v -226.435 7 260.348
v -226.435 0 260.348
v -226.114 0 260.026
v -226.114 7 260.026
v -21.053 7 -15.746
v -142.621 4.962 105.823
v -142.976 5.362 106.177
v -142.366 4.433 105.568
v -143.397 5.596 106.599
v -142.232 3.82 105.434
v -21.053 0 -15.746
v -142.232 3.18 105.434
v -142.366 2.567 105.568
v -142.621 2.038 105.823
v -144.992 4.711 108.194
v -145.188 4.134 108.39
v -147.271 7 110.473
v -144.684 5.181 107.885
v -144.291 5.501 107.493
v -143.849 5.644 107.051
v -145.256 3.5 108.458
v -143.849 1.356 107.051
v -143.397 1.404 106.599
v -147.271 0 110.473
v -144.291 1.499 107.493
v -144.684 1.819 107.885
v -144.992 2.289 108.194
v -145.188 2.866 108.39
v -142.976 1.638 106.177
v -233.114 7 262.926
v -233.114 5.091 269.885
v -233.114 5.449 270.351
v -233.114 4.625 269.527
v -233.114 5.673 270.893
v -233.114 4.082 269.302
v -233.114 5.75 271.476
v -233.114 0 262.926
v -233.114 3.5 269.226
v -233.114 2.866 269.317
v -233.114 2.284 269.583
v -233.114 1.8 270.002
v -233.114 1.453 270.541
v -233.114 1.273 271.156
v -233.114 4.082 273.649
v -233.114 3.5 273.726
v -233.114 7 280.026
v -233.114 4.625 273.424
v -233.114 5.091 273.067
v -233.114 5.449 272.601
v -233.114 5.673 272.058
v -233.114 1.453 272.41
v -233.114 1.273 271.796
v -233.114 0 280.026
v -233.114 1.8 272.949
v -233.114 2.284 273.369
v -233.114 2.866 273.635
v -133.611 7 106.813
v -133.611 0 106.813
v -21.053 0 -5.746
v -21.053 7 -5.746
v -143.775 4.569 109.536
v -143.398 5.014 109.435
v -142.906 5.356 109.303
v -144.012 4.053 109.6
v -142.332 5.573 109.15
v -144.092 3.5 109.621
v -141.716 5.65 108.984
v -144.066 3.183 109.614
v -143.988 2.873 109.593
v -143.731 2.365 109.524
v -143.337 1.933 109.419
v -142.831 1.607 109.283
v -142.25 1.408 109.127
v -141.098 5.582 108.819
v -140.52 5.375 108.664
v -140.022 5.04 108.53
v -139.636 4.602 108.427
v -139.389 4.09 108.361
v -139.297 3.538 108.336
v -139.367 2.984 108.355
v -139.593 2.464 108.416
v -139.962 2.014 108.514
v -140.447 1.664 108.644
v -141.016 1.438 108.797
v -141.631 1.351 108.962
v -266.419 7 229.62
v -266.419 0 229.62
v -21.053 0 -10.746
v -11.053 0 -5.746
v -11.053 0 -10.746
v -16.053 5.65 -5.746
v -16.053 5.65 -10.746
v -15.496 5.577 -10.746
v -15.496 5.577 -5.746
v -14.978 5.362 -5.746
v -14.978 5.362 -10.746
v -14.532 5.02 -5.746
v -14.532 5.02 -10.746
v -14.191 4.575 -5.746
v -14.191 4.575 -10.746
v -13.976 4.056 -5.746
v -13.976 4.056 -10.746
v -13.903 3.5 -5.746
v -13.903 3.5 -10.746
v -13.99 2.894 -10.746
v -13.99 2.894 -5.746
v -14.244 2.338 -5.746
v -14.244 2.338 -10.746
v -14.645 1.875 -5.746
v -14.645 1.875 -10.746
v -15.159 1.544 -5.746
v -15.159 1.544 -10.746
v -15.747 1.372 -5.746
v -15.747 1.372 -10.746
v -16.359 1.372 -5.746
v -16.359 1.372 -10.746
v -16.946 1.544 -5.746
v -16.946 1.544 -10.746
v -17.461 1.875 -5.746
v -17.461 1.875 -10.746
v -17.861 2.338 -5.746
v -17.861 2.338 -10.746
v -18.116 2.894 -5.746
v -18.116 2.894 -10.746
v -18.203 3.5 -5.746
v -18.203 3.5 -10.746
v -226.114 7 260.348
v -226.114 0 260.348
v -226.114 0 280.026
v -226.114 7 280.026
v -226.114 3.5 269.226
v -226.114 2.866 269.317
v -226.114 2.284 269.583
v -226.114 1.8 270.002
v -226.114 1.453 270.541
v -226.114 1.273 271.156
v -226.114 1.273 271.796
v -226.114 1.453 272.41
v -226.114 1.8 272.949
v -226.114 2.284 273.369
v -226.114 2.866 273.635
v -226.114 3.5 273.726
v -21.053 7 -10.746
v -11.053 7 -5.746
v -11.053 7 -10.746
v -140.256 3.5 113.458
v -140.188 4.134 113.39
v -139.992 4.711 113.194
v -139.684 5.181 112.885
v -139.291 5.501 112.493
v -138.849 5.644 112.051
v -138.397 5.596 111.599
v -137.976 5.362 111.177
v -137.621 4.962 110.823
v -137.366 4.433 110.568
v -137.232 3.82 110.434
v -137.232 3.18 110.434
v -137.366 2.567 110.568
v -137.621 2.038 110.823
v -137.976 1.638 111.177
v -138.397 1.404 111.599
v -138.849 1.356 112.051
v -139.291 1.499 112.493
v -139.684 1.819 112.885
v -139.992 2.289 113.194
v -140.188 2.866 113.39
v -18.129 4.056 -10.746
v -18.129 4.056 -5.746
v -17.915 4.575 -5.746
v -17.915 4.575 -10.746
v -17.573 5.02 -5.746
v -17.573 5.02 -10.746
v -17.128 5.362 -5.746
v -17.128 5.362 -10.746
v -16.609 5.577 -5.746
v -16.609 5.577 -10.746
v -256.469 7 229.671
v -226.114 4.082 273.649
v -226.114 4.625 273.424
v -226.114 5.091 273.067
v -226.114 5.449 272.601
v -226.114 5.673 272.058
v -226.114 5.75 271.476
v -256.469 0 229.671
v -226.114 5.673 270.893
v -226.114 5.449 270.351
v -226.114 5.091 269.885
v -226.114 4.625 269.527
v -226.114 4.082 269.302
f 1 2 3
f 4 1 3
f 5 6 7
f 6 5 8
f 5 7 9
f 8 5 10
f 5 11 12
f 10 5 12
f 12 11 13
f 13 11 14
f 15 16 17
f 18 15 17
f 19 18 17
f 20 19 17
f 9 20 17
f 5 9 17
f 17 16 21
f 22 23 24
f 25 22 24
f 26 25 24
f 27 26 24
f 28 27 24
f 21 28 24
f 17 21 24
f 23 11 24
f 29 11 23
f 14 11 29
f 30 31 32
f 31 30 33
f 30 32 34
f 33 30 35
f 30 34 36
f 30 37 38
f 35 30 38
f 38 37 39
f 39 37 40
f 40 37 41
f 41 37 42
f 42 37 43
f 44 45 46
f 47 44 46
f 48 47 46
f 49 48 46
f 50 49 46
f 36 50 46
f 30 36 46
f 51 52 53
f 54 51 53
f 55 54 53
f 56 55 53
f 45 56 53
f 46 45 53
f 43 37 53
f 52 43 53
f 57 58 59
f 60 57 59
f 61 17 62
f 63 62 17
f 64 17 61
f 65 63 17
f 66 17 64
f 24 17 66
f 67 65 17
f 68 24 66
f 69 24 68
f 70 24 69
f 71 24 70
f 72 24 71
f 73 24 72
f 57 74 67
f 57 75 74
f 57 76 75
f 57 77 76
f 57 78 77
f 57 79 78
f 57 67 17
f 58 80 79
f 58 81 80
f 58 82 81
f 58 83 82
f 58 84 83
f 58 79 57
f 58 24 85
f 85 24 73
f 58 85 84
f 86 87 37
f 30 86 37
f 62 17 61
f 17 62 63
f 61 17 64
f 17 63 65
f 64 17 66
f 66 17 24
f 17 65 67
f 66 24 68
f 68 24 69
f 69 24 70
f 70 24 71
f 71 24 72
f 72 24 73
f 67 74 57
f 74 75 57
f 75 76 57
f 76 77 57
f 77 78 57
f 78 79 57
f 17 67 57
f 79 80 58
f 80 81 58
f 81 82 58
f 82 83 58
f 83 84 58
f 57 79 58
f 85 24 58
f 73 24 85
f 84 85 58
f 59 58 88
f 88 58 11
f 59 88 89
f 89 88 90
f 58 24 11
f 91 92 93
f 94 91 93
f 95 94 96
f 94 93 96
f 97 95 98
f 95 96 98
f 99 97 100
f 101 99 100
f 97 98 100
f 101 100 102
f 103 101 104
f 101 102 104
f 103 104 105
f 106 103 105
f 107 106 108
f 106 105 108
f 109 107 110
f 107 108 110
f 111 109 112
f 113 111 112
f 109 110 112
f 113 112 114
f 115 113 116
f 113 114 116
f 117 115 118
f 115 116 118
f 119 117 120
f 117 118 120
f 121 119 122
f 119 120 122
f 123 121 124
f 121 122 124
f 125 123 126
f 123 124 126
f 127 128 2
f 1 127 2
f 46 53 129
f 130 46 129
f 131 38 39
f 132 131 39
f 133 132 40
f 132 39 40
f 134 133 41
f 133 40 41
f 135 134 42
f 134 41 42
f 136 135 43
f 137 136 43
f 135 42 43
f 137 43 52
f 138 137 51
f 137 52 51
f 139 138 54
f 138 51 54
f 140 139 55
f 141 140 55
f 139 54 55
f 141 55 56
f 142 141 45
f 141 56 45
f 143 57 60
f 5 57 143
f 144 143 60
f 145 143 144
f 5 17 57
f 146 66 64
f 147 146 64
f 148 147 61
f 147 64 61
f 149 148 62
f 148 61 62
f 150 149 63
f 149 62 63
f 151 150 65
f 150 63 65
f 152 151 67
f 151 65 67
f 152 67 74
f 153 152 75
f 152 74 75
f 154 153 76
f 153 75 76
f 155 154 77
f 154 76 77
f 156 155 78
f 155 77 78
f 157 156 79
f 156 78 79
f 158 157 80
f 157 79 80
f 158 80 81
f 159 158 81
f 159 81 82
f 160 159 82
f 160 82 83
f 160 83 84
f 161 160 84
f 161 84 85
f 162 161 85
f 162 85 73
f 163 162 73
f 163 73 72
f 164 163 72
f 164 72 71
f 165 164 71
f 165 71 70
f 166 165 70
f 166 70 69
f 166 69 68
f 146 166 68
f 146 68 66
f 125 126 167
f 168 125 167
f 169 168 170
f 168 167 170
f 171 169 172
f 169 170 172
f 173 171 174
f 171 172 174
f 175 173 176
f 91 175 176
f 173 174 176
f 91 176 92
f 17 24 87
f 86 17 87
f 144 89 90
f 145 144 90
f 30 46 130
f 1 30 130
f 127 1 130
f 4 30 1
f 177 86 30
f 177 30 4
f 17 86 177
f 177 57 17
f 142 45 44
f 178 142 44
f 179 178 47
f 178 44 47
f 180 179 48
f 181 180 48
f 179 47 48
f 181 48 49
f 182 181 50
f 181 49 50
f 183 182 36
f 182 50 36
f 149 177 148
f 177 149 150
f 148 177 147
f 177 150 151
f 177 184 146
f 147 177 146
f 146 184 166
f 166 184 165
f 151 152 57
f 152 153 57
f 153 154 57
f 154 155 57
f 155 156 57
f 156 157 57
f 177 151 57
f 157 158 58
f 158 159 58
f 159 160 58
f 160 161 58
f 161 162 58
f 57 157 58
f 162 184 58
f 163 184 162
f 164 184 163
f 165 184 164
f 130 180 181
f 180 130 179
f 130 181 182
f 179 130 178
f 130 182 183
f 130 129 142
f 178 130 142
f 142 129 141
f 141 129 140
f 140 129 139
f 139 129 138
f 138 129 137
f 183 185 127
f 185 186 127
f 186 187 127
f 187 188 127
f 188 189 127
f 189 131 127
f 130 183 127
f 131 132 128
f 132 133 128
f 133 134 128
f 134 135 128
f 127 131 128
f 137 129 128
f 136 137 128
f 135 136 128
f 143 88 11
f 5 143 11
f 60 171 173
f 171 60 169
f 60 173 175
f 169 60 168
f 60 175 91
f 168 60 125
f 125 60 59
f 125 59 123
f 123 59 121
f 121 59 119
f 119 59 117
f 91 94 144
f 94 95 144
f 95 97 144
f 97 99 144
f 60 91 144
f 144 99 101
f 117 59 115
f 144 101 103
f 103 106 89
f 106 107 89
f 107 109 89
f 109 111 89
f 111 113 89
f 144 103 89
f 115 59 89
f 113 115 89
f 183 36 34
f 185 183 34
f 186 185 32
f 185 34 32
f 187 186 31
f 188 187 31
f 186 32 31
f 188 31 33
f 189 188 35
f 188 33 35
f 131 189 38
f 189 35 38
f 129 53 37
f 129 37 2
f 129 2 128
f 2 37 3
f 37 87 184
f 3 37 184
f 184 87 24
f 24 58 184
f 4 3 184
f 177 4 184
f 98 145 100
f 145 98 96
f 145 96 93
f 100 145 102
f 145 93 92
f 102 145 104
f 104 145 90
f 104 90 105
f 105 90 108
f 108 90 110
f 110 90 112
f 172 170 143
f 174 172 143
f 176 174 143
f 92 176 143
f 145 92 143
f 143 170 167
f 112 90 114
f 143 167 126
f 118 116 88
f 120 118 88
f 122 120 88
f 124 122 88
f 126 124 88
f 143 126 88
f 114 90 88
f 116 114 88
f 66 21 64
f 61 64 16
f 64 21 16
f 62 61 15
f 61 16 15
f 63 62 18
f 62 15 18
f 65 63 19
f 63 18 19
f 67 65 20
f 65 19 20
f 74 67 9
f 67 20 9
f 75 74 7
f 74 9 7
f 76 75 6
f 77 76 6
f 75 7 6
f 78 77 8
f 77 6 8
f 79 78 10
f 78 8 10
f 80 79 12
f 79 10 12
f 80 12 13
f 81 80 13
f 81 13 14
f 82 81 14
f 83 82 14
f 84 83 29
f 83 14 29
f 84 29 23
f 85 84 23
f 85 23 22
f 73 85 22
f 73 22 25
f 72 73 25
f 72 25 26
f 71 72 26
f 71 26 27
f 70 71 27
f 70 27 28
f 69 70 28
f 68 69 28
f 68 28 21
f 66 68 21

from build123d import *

# Parameters (mm, degrees)
BOSS_EXTRU_1_DEPTH           = 7
ENL_V_MAT_EXTRU_1_DEPTH      = 7
ENL_V_MAT_EXTRU_2_DEPTH      = 7
ESQUISSE8_R                  = 2.15
ENL_V_MAT_EXTRU_3_DEPTH      = 10
FRACTIONNER1_SURFACE_1_BACK  = 391.822
FRACTIONNER1_SURFACE_1_DEPTH = 783.644
FRACTIONNER1_SURFACE_2_BACK  = 391.822
FRACTIONNER1_SURFACE_2_DEPTH = 783.644


with BuildPart() as part:
    # Esquisse4 → Boss.-Extru.1 (new body)
    with BuildSketch(Plane(origin=(0, 0, 0), x_dir=(1, 0, 0), z_dir=(0, 1, 0))):
        Polygon((-21.052631579, 15.745614035), (-266.418684651, -229.620439037), (-233.113598123, -262.925525564), (-233.113598123, -280.026030628), (-226.113598123, -280.026030628), (-226.113598123, -260.347610035), (-226.43517753, -260.347610035), (-226.113598123, -260.026030628), (-256.468937182, -229.670691568), (-21.052631579, 5.745614035), (-11.052631579, 5.745614035), (-11.052631579, 10.745614035), (-21.052631579, 10.745614035), align=None)
    extrude(amount=BOSS_EXTRU_1_DEPTH)

    # Esquisse5 → Enlèv. mat.-Extru.1 (cut)
    with BuildSketch(Plane.ZY.offset(233.113598123)):
        with BuildLine():
            Line((273.725778096, 3.5), (271.475778096, 3.5))
            Line((271.475778096, 3.5), (269.225778096, 3.5))
            ThreePointArc((269.225778096, 3.5), (271.475778096, 1.25), (273.725778096, 3.5))
        make_face()
        with BuildLine():
            Line((271.475778096, 5.75), (271.475778096, 3.5))
            Line((271.475778096, 3.5), (273.725778096, 3.5))
            ThreePointArc((273.725778096, 3.5), (273.066768354, 5.090990258), (271.475778096, 5.75))
        make_face()
        with BuildLine():
            Line((269.225778096, 3.5), (271.475778096, 3.5))
            Line((271.475778096, 3.5), (271.475778096, 5.75))
            ThreePointArc((271.475778096, 5.75), (269.884787838, 5.090990258), (269.225778096, 3.5))
        make_face()
    extrude(amount=-ENL_V_MAT_EXTRU_1_DEPTH, mode=Mode.SUBTRACT)

    # Esquisse6 → Enlèv. mat.-Extru.2 (cut)
    with BuildSketch(Plane(origin=(0, 0, -10.745614035), x_dir=(-1, 0, 0), z_dir=(0, 0, -1))):
        with BuildLine():
            Line((18.202631579, 3.5), (16.052631579, 3.5))
            Line((16.052631579, 3.5), (13.902631579, 3.5))
            ThreePointArc((13.902631579, 3.5), (16.052631579, 1.35), (18.202631579, 3.5))
        make_face()
        with BuildLine():
            Line((16.052631579, 5.65), (16.052631579, 3.5))
            Line((16.052631579, 3.5), (18.202631579, 3.5))
            ThreePointArc((18.202631579, 3.5), (17.572911158, 5.02027958), (16.052631579, 5.65))
        make_face()
        with BuildLine():
            Line((13.902631579, 3.5), (16.052631579, 3.5))
            Line((16.052631579, 3.5), (16.052631579, 5.65))
            ThreePointArc((16.052631579, 5.65), (14.532351999, 5.02027958), (13.902631579, 3.5))
        make_face()
    extrude(amount=-ENL_V_MAT_EXTRU_2_DEPTH, mode=Mode.SUBTRACT)

    # Esquisse8 → Enlèv. mat.-Extru.3 (cut)
    with BuildSketch(Plane(origin=(-18.399122807, 0, -18.399122807), x_dir=(-0.7071067811865475, 0, 0.7071067811865477), z_dir=(-0.7071067811865477, 0, -0.7071067811865475))):
        with Locations((177.252628093, 3.5)):
            Circle(ESQUISSE8_R)
    extrude(amount=-ENL_V_MAT_EXTRU_3_DEPTH, mode=Mode.SUBTRACT)


with BuildPart() as body_2:
    # Fractionner1: the piece behind the surface
    add(part.part)
    # Fractionner1 surface: a surface, the sketch's curves swept straight by 783.644 mm
    with BuildLine(Plane(origin=(0, 7, 0), x_dir=(1, 0, 0), z_dir=(0, 1, 0)).offset(-FRACTIONNER1_SURFACE_1_BACK), mode=Mode.PRIVATE) as fractionner1_surface_1_path:
        Line((-147.271192021, -110.472946407), (-133.610937983, -106.812692369))
    fractionner1_surface_1 = Shell.extrude(fractionner1_surface_1_path.wire(), (0 * FRACTIONNER1_SURFACE_1_DEPTH, 1 * FRACTIONNER1_SURFACE_1_DEPTH, 0 * FRACTIONNER1_SURFACE_1_DEPTH))
    split(bisect_by=fractionner1_surface_1, keep=Keep.BOTTOM)


with BuildPart() as part_1:
    add(part.part)

    # Fractionner1: split by a surface, the side it looks to stays
    # Fractionner1 surface: a surface, the sketch's curves swept straight by 783.644 mm
    with BuildLine(Plane(origin=(0, 7, 0), x_dir=(1, 0, 0), z_dir=(0, 1, 0)).offset(-FRACTIONNER1_SURFACE_2_BACK), mode=Mode.PRIVATE) as fractionner1_surface_2_path:
        Line((-147.271192021, -110.472946407), (-133.610937983, -106.812692369))
    fractionner1_surface_2 = Shell.extrude(fractionner1_surface_2_path.wire(), (0 * FRACTIONNER1_SURFACE_2_DEPTH, 1 * FRACTIONNER1_SURFACE_2_DEPTH, 0 * FRACTIONNER1_SURFACE_2_DEPTH))
    split(bisect_by=fractionner1_surface_2, keep=Keep.TOP)


solid = Compound([body_2.part, part_1.part])
